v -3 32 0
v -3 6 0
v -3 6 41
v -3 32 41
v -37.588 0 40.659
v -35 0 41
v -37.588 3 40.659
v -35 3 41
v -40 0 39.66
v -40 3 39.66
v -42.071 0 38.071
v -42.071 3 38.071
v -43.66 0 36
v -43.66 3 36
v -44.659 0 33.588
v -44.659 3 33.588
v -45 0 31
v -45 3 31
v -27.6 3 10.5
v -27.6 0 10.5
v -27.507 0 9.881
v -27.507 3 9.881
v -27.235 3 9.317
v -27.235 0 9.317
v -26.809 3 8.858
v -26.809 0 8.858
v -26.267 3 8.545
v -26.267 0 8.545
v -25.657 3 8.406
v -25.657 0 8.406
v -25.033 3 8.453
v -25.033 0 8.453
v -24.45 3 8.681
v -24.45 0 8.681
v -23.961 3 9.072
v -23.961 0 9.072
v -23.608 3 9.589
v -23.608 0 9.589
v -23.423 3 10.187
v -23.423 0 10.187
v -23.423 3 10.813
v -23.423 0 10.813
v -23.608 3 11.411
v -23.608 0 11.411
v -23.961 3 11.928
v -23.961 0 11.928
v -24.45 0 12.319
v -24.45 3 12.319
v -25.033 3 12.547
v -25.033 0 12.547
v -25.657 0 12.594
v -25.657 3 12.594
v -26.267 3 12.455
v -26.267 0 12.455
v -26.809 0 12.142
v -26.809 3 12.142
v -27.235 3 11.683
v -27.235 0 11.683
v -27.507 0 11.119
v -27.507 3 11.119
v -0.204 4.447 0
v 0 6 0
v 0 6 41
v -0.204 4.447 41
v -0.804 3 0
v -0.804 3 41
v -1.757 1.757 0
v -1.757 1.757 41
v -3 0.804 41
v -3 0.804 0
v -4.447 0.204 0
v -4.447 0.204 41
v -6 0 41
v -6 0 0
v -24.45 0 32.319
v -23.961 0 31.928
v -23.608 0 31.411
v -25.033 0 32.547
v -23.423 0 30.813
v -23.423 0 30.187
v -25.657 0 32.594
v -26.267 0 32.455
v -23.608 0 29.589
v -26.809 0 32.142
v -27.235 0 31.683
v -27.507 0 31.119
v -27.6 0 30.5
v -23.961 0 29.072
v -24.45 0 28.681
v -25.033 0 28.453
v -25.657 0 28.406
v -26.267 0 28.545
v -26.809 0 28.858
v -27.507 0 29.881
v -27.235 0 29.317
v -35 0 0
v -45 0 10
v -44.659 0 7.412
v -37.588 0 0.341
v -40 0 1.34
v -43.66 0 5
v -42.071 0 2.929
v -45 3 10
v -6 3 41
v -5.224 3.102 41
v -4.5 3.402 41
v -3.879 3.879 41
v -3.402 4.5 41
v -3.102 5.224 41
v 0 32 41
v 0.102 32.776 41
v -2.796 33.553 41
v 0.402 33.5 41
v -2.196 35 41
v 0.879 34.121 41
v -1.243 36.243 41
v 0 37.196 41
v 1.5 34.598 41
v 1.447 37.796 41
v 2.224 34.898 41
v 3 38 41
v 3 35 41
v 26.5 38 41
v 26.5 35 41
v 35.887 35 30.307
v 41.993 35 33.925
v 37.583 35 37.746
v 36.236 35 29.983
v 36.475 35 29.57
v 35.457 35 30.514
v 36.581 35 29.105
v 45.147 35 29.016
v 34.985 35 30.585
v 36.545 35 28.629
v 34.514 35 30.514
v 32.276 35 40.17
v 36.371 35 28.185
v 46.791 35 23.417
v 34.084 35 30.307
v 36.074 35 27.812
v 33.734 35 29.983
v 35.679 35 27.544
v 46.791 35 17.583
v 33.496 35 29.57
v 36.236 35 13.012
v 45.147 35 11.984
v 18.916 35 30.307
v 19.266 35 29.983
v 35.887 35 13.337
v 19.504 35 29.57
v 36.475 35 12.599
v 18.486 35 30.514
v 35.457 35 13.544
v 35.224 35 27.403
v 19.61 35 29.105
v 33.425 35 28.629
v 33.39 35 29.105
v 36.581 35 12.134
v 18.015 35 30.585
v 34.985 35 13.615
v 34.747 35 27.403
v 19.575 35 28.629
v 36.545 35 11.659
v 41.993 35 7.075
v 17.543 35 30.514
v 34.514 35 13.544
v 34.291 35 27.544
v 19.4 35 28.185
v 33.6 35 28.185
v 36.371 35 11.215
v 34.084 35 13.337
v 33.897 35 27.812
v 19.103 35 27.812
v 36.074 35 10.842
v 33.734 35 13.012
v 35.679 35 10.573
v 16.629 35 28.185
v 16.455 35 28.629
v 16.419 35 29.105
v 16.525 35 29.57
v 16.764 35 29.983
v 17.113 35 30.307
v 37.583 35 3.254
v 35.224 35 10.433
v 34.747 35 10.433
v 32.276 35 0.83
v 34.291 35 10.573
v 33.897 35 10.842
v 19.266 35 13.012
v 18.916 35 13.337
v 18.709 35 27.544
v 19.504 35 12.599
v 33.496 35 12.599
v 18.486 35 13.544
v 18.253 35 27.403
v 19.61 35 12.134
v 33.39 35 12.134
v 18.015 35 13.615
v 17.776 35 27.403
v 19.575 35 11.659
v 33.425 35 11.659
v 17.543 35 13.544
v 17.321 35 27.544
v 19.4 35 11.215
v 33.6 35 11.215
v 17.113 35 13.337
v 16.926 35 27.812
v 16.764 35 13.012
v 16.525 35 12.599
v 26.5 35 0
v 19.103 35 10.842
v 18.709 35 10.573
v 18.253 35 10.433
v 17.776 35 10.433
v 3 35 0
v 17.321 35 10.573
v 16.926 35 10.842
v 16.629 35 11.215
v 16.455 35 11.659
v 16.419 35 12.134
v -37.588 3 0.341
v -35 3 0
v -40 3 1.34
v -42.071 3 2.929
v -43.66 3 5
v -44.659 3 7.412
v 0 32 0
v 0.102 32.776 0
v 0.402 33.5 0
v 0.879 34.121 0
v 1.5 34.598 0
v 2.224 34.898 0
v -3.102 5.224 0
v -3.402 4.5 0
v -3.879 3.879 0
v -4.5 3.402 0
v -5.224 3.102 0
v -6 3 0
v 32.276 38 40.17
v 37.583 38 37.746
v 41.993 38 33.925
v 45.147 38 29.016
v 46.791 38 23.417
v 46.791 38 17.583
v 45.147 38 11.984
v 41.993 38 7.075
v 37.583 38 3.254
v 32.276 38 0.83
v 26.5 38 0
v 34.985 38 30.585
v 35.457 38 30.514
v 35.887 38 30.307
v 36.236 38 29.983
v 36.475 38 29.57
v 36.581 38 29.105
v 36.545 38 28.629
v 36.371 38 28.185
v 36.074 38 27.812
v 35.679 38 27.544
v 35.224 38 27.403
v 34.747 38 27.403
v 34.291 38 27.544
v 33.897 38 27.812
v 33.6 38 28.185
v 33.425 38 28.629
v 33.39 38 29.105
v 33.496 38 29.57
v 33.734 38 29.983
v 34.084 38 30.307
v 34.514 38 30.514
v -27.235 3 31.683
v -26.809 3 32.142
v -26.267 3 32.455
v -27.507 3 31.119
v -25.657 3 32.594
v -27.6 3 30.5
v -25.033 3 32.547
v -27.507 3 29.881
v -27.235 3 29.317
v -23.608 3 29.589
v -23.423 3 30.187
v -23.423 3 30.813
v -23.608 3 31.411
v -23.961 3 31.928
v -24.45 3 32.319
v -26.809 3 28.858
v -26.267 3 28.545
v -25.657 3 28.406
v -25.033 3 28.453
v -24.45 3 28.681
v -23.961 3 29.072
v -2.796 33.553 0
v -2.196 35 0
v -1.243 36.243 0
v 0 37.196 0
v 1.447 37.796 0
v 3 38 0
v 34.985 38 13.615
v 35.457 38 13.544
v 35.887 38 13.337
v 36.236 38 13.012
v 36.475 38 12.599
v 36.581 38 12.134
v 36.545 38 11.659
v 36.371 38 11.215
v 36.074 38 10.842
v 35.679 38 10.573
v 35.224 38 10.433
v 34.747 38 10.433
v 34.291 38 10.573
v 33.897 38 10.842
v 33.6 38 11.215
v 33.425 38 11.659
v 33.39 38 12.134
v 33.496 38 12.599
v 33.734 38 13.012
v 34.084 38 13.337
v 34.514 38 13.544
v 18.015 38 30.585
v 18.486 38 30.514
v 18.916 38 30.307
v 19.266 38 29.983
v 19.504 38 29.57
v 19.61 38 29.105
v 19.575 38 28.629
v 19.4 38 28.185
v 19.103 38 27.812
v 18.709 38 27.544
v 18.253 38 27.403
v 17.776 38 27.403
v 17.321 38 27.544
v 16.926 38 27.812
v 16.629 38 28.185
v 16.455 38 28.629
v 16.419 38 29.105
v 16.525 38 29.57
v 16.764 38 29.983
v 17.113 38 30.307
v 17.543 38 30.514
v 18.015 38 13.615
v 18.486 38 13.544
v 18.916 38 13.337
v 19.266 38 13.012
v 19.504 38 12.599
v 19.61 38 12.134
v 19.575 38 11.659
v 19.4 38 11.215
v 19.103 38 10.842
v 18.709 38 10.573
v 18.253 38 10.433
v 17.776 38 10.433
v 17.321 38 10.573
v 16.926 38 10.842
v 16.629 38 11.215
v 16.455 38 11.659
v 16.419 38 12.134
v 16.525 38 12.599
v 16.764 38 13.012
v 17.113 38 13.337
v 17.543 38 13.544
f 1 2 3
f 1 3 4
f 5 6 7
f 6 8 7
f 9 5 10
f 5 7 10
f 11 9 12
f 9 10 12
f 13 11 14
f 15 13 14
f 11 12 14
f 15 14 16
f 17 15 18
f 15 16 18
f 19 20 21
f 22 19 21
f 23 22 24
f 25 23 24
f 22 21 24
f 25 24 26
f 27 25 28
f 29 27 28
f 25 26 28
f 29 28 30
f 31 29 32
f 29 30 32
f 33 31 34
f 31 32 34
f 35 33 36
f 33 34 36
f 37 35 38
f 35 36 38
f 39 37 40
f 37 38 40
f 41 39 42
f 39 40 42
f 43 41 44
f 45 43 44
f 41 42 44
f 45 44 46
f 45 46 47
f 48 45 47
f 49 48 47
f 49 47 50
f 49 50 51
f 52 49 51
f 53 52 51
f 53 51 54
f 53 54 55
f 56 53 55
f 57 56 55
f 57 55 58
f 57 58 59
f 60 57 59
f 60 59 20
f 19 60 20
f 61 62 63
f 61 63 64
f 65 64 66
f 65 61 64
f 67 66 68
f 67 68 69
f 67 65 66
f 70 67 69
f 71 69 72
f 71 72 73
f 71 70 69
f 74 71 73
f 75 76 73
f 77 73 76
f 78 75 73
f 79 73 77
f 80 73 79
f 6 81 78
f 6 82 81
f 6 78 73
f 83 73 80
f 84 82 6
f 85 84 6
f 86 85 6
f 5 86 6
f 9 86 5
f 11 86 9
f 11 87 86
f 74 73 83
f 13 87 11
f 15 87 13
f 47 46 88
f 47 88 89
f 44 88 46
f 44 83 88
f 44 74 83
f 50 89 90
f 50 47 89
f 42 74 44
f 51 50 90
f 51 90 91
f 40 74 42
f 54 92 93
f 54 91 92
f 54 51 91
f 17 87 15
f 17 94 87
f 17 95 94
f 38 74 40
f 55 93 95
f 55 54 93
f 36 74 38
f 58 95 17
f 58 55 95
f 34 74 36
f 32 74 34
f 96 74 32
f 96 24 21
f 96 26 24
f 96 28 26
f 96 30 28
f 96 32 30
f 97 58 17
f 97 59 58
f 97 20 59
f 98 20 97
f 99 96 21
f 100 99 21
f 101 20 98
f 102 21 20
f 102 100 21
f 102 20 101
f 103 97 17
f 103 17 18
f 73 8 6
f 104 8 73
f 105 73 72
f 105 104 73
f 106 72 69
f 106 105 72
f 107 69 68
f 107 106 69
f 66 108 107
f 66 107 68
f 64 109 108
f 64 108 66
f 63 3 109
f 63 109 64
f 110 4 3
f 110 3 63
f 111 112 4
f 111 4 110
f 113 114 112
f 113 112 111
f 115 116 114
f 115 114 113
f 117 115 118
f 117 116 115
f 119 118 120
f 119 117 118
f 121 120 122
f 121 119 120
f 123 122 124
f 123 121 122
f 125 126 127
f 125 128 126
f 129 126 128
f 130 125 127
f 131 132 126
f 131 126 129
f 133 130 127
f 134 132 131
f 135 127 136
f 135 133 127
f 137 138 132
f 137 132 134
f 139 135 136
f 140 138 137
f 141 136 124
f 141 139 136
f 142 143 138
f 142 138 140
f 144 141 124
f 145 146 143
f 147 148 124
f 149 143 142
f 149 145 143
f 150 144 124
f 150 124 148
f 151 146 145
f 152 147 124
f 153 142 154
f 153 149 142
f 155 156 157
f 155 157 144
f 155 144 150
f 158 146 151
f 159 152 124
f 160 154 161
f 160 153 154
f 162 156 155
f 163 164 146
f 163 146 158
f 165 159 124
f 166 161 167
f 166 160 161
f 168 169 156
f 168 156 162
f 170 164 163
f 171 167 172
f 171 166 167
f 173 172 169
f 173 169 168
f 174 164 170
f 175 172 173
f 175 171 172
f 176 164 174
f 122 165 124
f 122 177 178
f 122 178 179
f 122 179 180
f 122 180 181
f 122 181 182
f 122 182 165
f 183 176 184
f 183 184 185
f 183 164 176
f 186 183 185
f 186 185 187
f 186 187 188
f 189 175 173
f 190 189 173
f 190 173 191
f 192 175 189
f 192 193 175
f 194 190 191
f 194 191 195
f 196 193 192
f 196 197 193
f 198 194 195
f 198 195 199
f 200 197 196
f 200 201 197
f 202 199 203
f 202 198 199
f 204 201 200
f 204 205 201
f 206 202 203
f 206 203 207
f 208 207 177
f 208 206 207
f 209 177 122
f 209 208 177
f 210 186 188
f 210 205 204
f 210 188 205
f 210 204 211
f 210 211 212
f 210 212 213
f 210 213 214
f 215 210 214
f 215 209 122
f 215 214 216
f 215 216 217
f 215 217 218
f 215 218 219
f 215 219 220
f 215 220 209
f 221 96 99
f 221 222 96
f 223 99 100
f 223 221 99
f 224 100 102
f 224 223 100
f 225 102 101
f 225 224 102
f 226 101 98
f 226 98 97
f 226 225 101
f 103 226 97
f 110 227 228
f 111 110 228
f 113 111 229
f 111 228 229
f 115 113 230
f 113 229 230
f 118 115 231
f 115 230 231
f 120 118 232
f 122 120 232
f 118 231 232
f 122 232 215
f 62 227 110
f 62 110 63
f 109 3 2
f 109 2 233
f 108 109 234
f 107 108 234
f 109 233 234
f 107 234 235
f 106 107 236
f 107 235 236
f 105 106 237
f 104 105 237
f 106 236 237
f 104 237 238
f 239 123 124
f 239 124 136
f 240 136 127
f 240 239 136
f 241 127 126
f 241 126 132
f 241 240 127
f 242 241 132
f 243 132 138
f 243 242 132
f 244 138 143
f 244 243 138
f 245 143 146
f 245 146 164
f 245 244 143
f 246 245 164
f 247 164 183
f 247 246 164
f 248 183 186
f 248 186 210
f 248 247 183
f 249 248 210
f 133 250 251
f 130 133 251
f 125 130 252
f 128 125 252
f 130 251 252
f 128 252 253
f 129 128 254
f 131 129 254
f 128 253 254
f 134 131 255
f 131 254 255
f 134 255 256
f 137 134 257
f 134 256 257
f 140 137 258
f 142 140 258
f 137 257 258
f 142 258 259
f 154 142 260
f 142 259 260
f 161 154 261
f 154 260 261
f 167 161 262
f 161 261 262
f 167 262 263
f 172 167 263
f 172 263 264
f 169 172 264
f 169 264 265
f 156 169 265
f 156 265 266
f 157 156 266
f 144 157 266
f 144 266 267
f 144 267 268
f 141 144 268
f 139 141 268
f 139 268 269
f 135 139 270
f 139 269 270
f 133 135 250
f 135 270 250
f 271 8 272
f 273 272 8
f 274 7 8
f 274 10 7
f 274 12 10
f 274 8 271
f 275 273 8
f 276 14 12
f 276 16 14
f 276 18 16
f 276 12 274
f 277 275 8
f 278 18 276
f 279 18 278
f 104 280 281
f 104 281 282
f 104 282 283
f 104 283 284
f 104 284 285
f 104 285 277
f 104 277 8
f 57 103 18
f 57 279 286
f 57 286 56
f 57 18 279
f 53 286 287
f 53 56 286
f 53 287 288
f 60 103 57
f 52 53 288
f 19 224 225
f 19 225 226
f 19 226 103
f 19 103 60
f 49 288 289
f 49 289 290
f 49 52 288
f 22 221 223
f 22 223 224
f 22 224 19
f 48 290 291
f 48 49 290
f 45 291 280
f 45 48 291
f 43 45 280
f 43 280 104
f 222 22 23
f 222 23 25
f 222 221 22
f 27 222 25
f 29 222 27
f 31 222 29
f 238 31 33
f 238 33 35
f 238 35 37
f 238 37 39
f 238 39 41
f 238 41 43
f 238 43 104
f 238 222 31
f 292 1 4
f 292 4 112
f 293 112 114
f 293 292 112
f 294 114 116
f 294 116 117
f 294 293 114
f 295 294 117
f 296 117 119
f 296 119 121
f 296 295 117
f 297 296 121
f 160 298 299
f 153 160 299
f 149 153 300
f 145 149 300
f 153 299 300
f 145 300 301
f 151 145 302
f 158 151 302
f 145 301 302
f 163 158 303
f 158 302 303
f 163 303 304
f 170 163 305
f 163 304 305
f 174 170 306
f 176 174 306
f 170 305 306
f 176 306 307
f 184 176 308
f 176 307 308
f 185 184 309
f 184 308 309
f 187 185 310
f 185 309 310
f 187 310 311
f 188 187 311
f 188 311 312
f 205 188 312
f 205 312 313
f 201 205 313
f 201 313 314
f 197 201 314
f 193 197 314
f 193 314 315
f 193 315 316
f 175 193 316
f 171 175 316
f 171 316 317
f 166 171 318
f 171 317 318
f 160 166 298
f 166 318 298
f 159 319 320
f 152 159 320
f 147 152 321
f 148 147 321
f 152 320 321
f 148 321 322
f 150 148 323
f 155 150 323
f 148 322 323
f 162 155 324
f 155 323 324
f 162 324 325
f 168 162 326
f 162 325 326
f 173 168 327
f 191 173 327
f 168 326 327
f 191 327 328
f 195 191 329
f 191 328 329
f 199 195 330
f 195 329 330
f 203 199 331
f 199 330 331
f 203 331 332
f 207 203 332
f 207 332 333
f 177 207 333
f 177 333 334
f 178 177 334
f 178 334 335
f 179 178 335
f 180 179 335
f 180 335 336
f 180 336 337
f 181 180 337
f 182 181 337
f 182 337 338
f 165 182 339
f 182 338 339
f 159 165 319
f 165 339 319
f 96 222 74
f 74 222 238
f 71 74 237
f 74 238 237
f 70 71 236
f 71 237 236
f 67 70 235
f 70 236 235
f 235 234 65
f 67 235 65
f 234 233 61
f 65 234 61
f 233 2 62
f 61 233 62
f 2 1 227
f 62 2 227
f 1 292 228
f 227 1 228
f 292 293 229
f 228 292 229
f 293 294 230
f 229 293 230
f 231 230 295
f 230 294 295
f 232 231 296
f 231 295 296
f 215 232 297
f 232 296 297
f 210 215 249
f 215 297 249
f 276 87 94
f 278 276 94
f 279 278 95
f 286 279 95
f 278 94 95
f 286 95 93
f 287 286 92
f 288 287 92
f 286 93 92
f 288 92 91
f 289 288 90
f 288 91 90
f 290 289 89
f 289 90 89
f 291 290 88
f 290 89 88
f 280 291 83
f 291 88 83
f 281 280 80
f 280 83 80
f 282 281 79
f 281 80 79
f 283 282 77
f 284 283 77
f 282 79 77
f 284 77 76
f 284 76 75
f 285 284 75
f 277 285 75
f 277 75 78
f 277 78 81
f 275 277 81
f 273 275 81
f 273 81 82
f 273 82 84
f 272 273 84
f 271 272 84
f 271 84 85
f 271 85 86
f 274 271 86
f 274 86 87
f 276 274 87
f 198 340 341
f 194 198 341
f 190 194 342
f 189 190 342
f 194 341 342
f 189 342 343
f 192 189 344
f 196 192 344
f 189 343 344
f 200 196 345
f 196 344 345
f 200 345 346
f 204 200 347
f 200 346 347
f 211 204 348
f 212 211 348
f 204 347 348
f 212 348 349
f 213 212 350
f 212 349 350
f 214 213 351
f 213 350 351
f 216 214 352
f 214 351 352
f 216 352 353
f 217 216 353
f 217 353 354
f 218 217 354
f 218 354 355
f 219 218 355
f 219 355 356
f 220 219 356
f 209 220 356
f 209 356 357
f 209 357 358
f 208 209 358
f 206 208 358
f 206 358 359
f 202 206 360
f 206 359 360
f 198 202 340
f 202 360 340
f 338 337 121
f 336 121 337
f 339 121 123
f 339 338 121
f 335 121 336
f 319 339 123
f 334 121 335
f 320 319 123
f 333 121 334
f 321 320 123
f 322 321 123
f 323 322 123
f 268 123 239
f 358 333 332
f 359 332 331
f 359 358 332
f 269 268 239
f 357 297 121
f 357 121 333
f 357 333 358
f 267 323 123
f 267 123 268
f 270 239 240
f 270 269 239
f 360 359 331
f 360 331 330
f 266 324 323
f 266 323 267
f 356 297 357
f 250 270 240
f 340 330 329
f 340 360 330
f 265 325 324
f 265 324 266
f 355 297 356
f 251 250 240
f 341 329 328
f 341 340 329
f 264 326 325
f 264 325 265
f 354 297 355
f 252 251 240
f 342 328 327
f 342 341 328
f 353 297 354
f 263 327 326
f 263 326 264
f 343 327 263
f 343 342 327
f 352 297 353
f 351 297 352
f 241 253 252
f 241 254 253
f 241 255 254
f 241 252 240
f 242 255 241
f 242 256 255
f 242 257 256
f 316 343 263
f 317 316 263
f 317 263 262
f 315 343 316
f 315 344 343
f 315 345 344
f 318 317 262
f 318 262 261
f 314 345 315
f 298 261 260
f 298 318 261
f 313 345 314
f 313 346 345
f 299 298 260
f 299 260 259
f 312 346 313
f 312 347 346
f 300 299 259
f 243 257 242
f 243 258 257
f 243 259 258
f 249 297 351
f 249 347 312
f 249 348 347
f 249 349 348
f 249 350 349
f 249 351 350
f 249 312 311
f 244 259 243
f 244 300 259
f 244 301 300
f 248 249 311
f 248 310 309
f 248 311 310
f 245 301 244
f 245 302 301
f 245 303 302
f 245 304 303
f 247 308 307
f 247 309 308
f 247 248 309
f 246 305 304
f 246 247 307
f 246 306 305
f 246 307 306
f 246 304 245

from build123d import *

# Parameters (mm, degrees)
EXTRUDE_THIN1_DEPTH    = 41
CONVERT_SOLID1_DEPTH   = 41
CONVERT_SOLID1_2_DEPTH = 41
SKETCH6_R              = 1.6
CUT_EXTRUDE1_DEPTH     = 3
M5X0_8_TAPPED_HOLE1_D  = 4.2
FILLET1_R              = 10


# Read off the part's stored shape, not the designer's step: Convert-Solid1
with BuildPart() as part:
    # Sketch1 → Extrude-Thin1 (new body)
    with BuildSketch(Plane.XY):
        Polygon((50, 35), (0, 35), (0, 0), (-45, 0), (-45, 3), (-3, 3), (-3, 38), (50, 38), align=None)
    extrude(amount=EXTRUDE_THIN1_DEPTH)

    # Convert-Solid1 outline → Convert-Solid1 (cut)
    with BuildSketch(Plane.XY):
        with BuildLine():
            Line((-3, 38), (-3, 32))
            ThreePointArc((-3, 32), (-1.242640687, 36.242640687), (3, 38))
            Line((3, 38), (-3, 38))
        make_face()
        with BuildLine():
            Line((0, 0), (0, 6))
            ThreePointArc((0, 6), (-1.757359313, 1.757359313), (-6, 0))
            Line((-6, 0), (0, 0))
        make_face()
    extrude(amount=CONVERT_SOLID1_DEPTH, mode=Mode.SUBTRACT)

    # Convert-Solid1 2 outline → Convert-Solid1 2 (add)
    with BuildSketch(Plane.XY):
        with BuildLine():
            Line((-3, 3), (-3, 6))
            ThreePointArc((-3, 6), (-3.878679656, 3.878679656), (-6, 3))
            Line((-6, 3), (-3, 3))
        make_face()
        with BuildLine():
            Line((0, 35), (0, 32))
            ThreePointArc((0, 32), (0.878679656, 34.121320344), (3, 35))
            Line((3, 35), (0, 35))
        make_face()
    extrude(amount=CONVERT_SOLID1_2_DEPTH)

    # Sketch6 → Cut-Extrude1 (cut)
    with BuildSketch(Plane(origin=(0, 38, 0), x_dir=(1, 0, 0), z_dir=(0, 1, 0))):
        with Locations(Location((34.985281374, -12.014718626, 0), (0, 0, 270))):
            Circle(SKETCH6_R)
        with Locations(Location((34.985281374, -28.985281374, 0), (0, 0, 270))):
            Circle(SKETCH6_R)
        with Locations(Location((18.014718626, -28.985281374, 0), (0, 0, 270))):
            Circle(SKETCH6_R)
        with Locations(Location((18.014718626, -12.014718626, 0), (0, 0, 270))):
            Circle(SKETCH6_R)
        with BuildLine():
            Line((51.105144577, 0), (51.105144577, -41))
            Line((51.105144577, -41), (26.5, -41))
            ThreePointArc((26.5, -41), (47, -20.5), (26.5, 0))
            Line((26.5, 0), (51.105144577, 0))
        make_face()
    extrude(amount=-CUT_EXTRUDE1_DEPTH, mode=Mode.SUBTRACT)

    # M5x0.8 Tapped Hole1 (through all)
    with Locations(Plane(origin=(0, 3, 0), x_dir=(1, 0, 0), z_dir=(0, 1, 0))):
        with Locations((-25.5, -30.5), (-25.5, -10.5)):
            Hole(M5X0_8_TAPPED_HOLE1_D / 2)

    # Fillet1
    fillet1_edges = [part.edges().sort_by_distance(p)[0] for p in [
        (-45, 1.5, 41),
        (-45, 1.5, 0),
    ]]
    fillet(fillet1_edges, radius=FILLET1_R)


solid = part.part
